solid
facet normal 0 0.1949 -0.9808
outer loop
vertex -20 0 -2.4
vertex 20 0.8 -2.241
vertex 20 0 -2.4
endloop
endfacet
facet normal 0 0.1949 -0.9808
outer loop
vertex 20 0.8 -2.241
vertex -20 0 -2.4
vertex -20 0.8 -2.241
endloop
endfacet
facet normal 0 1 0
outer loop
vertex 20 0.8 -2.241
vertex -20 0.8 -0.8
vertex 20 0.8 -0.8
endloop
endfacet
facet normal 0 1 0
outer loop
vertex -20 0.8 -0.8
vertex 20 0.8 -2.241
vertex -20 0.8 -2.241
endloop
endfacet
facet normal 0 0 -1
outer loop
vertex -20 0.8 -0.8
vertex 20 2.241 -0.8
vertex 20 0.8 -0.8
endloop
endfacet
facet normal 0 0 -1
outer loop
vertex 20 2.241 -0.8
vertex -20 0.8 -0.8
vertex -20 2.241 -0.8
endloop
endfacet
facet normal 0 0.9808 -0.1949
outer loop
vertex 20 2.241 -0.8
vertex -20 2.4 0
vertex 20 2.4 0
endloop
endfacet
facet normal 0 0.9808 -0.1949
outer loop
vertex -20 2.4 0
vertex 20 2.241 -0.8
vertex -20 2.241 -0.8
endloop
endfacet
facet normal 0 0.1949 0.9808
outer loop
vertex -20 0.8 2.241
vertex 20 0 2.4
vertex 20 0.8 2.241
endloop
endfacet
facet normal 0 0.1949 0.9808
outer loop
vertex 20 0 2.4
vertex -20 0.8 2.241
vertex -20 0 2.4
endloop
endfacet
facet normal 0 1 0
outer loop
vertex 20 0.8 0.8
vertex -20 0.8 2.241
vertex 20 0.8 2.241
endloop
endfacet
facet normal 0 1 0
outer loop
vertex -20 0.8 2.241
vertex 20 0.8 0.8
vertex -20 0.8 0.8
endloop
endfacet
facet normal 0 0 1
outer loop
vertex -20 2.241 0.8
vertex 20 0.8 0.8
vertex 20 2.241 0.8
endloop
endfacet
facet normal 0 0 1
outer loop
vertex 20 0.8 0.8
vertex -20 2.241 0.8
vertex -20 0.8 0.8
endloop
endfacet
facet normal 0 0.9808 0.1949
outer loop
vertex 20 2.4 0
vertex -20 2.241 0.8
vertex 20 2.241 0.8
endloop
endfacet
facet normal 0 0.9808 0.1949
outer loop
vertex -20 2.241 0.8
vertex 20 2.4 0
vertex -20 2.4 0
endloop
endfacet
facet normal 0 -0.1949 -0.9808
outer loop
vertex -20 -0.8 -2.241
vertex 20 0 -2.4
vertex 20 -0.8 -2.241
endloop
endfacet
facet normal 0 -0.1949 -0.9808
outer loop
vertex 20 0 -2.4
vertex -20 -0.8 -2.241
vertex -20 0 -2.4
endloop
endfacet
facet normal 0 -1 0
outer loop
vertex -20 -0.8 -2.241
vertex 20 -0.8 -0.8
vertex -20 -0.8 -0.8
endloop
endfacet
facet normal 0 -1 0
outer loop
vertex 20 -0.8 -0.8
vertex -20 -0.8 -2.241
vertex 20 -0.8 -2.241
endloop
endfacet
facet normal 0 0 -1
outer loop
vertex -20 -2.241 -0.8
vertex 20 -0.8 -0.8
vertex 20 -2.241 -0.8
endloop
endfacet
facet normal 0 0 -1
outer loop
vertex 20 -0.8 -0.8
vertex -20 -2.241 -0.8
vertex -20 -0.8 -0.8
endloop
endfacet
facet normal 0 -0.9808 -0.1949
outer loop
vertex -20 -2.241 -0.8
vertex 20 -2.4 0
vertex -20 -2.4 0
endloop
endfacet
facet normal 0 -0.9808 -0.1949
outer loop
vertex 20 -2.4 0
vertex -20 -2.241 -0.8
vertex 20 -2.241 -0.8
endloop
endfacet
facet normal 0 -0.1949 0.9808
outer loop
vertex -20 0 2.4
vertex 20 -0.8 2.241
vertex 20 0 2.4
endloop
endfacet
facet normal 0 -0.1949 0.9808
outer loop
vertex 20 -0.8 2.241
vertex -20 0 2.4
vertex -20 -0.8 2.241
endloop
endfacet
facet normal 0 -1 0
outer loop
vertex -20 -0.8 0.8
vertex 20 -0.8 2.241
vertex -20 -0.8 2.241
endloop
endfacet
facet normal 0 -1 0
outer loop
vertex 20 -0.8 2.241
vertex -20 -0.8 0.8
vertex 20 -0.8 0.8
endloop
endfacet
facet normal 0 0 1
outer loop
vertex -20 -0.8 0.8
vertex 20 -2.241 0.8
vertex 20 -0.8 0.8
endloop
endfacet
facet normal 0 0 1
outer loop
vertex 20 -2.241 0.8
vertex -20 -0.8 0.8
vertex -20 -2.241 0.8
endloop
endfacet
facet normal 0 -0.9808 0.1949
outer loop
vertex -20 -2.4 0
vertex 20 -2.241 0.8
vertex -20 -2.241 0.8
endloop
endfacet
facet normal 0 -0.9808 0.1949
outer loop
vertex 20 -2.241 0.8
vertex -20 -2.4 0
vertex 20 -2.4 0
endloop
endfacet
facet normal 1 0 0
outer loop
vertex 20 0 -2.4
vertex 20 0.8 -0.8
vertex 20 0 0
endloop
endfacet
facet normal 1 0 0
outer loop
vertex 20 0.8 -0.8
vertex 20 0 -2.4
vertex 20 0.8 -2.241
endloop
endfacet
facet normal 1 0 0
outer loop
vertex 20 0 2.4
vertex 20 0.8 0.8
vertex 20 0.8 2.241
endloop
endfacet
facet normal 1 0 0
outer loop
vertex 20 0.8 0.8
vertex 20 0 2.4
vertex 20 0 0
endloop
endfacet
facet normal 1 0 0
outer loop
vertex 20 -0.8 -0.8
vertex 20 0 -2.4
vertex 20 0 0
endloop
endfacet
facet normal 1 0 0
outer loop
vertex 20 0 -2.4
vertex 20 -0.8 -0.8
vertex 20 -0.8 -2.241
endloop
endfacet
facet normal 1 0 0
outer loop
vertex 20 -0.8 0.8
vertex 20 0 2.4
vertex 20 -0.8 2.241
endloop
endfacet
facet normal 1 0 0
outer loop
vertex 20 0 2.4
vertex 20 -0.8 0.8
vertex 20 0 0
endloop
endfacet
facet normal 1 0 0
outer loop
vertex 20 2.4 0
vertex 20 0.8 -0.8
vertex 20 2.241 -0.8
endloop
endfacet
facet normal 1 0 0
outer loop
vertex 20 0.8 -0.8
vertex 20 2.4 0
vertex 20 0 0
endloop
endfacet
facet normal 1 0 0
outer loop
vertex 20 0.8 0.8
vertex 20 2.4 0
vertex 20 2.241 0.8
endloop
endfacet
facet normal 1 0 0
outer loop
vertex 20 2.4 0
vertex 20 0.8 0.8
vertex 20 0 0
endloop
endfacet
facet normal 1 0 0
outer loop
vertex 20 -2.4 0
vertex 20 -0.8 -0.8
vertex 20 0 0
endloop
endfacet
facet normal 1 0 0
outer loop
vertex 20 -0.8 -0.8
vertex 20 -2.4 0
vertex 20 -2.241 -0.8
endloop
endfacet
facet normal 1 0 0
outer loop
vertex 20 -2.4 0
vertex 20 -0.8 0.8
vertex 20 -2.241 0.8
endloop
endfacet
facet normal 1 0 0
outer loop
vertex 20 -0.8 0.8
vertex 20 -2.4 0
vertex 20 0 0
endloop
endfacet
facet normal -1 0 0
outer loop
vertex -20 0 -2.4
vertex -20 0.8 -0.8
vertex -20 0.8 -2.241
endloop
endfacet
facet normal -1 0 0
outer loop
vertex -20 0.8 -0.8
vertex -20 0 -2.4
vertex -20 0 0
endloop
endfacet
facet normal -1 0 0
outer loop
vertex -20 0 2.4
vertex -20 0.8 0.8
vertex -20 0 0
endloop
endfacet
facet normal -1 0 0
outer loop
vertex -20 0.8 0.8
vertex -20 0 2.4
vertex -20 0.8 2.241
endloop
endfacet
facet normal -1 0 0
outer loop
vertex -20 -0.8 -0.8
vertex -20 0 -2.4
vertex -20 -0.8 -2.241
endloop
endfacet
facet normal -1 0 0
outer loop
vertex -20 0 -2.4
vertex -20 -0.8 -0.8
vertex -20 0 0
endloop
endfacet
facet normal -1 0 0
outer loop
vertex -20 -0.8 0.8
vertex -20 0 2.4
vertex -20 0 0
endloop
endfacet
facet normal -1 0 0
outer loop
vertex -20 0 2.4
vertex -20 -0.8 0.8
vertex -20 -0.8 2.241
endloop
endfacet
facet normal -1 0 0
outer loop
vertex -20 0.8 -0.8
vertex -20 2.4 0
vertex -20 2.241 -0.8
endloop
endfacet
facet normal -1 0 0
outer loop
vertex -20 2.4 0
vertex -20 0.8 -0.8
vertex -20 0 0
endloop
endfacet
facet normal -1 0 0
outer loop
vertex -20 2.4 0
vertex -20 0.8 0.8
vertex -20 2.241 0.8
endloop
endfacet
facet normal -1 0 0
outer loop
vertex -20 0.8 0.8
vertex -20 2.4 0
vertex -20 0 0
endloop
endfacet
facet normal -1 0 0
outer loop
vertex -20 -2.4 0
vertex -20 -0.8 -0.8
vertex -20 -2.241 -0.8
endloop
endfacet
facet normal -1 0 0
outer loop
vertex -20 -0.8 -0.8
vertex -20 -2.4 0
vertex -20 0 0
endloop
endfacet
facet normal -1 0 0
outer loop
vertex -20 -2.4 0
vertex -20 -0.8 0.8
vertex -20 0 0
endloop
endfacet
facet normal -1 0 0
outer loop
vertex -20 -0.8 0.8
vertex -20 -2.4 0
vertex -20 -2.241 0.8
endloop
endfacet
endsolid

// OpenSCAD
// file: ../p/axle.scad
use <../lib.scad>
function ldraw_lib__axle() = [
// 0 Axle
// 0 Name: axle.dat
// 0 Author: James Jessiman
// 0 !LDRAW_ORG Primitive UPDATE 2003-01
// 0 !LICENSE Licensed under CC BY 2.0 and CC BY 4.0 : see CAreadme.txt
// 
// 0 BFC CERTIFY CCW
  [0,"BFC","CERTIFY"],
  [0,"BFC","CCW"],
// 
// 0 !HISTORY 2000-04-23 [sbliss] Added conditional edges along outermost diameters
// 0 !HISTORY 2000-05-07 [PTadmin] Official Update 2000-01
// 0 !HISTORY 2002-11-08 [OrionP] Adjusted fit and precision
// 0 !HISTORY 2003-03-12 [PTadmin] Official Update 2003-01
// 0 !HISTORY 2007-06-24 [PTadmin] Header formatted for Contributor Agreement
// 0 !HISTORY 2008-07-01 [PTadmin] Official Update 2008-01
// 
// 
// 5 24 6 0 0 6 1 0 5.602 0 2 5.602 0 -2
  [5,24,6,0,0,6,1,0,5.602,0,2,5.602,0,-2],
// 5 24 0 0 6 0 1 6 2 0 5.602 -2 0 5.602
  [5,24,0,0,6,0,1,6,2,0,5.602,-2,0,5.602],
// 5 24 -6 0 0 -6 1 0 -5.602 0 -2 -5.602 0 2
  [5,24,-6,0,0,-6,1,0,-5.602,0,-2,-5.602,0,2],
// 5 24 0 0 -6 0 1 -6 -2 0 -5.602 2 0 -5.602
  [5,24,0,0,-6,0,1,-6,-2,0,-5.602,2,0,-5.602],
// 
// 2 24 6 0 0 5.602 0 2
  [2,24,6,0,0,5.602,0,2],
// 2 24 5.602 0 2 2 0 2
  [2,24,5.602,0,2,2,0,2],
// 2 24 2 0 2 2 0 5.602
  [2,24,2,0,2,2,0,5.602],
// 2 24 2 0 5.602 0 0 6
  [2,24,2,0,5.602,0,0,6],
// 2 24 -6 0 0 -5.602 0 2
  [2,24,-6,0,0,-5.602,0,2],
// 2 24 -5.602 0 2 -2 0 2
  [2,24,-5.602,0,2,-2,0,2],
// 2 24 -2 0 2 -2 0 5.602
  [2,24,-2,0,2,-2,0,5.602],
// 2 24 -2 0 5.602 -0 0 6
  [2,24,-2,0,5.602,-0,0,6],
// 2 24 6 0 -0 5.602 0 -2
  [2,24,6,0,-0,5.602,0,-2],
// 2 24 5.602 0 -2 2 0 -2
  [2,24,5.602,0,-2,2,0,-2],
// 2 24 2 0 -2 2 0 -5.602
  [2,24,2,0,-2,2,0,-5.602],
// 2 24 2 0 -5.602 0 0 -6
  [2,24,2,0,-5.602,0,0,-6],
// 2 24 -6 0 -0 -5.602 0 -2
  [2,24,-6,0,-0,-5.602,0,-2],
// 2 24 -5.602 0 -2 -2 0 -2
  [2,24,-5.602,0,-2,-2,0,-2],
// 2 24 -2 0 -2 -2 0 -5.602
  [2,24,-2,0,-2,-2,0,-5.602],
// 2 24 -2 0 -5.602 -0 0 -6
  [2,24,-2,0,-5.602,-0,0,-6],
// 2 24 6 1 0 5.602 1 2
  [2,24,6,1,0,5.602,1,2],
// 2 24 5.602 1 2 2 1 2
  [2,24,5.602,1,2,2,1,2],
// 2 24 2 1 2 2 1 5.602
  [2,24,2,1,2,2,1,5.602],
// 2 24 2 1 5.602 0 1 6
  [2,24,2,1,5.602,0,1,6],
// 2 24 -6 1 0 -5.602 1 2
  [2,24,-6,1,0,-5.602,1,2],
// 2 24 -5.602 1 2 -2 1 2
  [2,24,-5.602,1,2,-2,1,2],
// 2 24 -2 1 2 -2 1 5.602
  [2,24,-2,1,2,-2,1,5.602],
// 2 24 -2 1 5.602 -0 1 6
  [2,24,-2,1,5.602,-0,1,6],
// 2 24 6 1 -0 5.602 1 -2
  [2,24,6,1,-0,5.602,1,-2],
// 2 24 5.602 1 -2 2 1 -2
  [2,24,5.602,1,-2,2,1,-2],
// 2 24 2 1 -2 2 1 -5.602
  [2,24,2,1,-2,2,1,-5.602],
// 2 24 2 1 -5.602 0 1 -6
  [2,24,2,1,-5.602,0,1,-6],
// 2 24 -6 1 -0 -5.602 1 -2
  [2,24,-6,1,-0,-5.602,1,-2],
// 2 24 -5.602 1 -2 -2 1 -2
  [2,24,-5.602,1,-2,-2,1,-2],
// 2 24 -2 1 -2 -2 1 -5.602
  [2,24,-2,1,-2,-2,1,-5.602],
// 2 24 -2 1 -5.602 -0 1 -6
  [2,24,-2,1,-5.602,-0,1,-6],
// 
// 2 24 5.602 0 2 5.602 1 2
  [2,24,5.602,0,2,5.602,1,2],
// 2 24 2 0 2 2 1 2
  [2,24,2,0,2,2,1,2],
// 2 24 2 0 5.602 2 1 5.602
  [2,24,2,0,5.602,2,1,5.602],
// 2 24 -5.602 0 2 -5.602 1 2
  [2,24,-5.602,0,2,-5.602,1,2],
// 2 24 -2 0 2 -2 1 2
  [2,24,-2,0,2,-2,1,2],
// 2 24 -2 0 5.602 -2 1 5.602
  [2,24,-2,0,5.602,-2,1,5.602],
// 2 24 5.602 0 -2 5.602 1 -2
  [2,24,5.602,0,-2,5.602,1,-2],
// 2 24 2 0 -2 2 1 -2
  [2,24,2,0,-2,2,1,-2],
// 2 24 2 0 -5.602 2 1 -5.602
  [2,24,2,0,-5.602,2,1,-5.602],
// 2 24 -5.602 0 -2 -5.602 1 -2
  [2,24,-5.602,0,-2,-5.602,1,-2],
// 2 24 -2 0 -2 -2 1 -2
  [2,24,-2,0,-2,-2,1,-2],
// 2 24 -2 0 -5.602 -2 1 -5.602
  [2,24,-2,0,-5.602,-2,1,-5.602],
// 
// 4 16 6 0 0 6 1 0 5.602 1 2 5.602 0 2
  [4,16,6,0,0,6,1,0,5.602,1,2,5.602,0,2],
// 4 16 5.602 0 2 5.602 1 2 2 1 2 2 0 2
  [4,16,5.602,0,2,5.602,1,2,2,1,2,2,0,2],
// 4 16 2 0 2 2 1 2 2 1 5.602 2 0 5.602
  [4,16,2,0,2,2,1,2,2,1,5.602,2,0,5.602],
// 4 16 2 0 5.602 2 1 5.602 0 1 6 0 0 6
  [4,16,2,0,5.602,2,1,5.602,0,1,6,0,0,6],
// 4 16 -6 0 0 -5.602 0 2 -5.602 1 2 -6 1 0
  [4,16,-6,0,0,-5.602,0,2,-5.602,1,2,-6,1,0],
// 4 16 -5.602 0 2 -2 0 2 -2 1 2 -5.602 1 2
  [4,16,-5.602,0,2,-2,0,2,-2,1,2,-5.602,1,2],
// 4 16 -2 0 2 -2 0 5.602 -2 1 5.602 -2 1 2
  [4,16,-2,0,2,-2,0,5.602,-2,1,5.602,-2,1,2],
// 4 16 -2 0 5.602 -0 0 6 -0 1 6 -2 1 5.602
  [4,16,-2,0,5.602,-0,0,6,-0,1,6,-2,1,5.602],
// 4 16 6 0 -0 5.602 0 -2 5.602 1 -2 6 1 -0
  [4,16,6,0,-0,5.602,0,-2,5.602,1,-2,6,1,-0],
// 4 16 5.602 0 -2 2 0 -2 2 1 -2 5.602 1 -2
  [4,16,5.602,0,-2,2,0,-2,2,1,-2,5.602,1,-2],
// 4 16 2 0 -2 2 0 -5.602 2 1 -5.602 2 1 -2
  [4,16,2,0,-2,2,0,-5.602,2,1,-5.602,2,1,-2],
// 4 16 2 0 -5.602 0 0 -6 0 1 -6 2 1 -5.602
  [4,16,2,0,-5.602,0,0,-6,0,1,-6,2,1,-5.602],
// 4 16 -6 0 -0 -6 1 -0 -5.602 1 -2 -5.602 0 -2
  [4,16,-6,0,-0,-6,1,-0,-5.602,1,-2,-5.602,0,-2],
// 4 16 -5.602 0 -2 -5.602 1 -2 -2 1 -2 -2 0 -2
  [4,16,-5.602,0,-2,-5.602,1,-2,-2,1,-2,-2,0,-2],
// 4 16 -2 0 -2 -2 1 -2 -2 1 -5.602 -2 0 -5.602
  [4,16,-2,0,-2,-2,1,-2,-2,1,-5.602,-2,0,-5.602],
// 4 16 -2 0 -5.602 -2 1 -5.602 -0 1 -6 -0 0 -6
  [4,16,-2,0,-5.602,-2,1,-5.602,-0,1,-6,-0,0,-6],
// 
// 4 16 6 0 0 5.602 0 2 2 0 2 0 0 0
  [4,16,6,0,0,5.602,0,2,2,0,2,0,0,0],
// 4 16 -6 0 0 0 0 0 -2 0 2 -5.602 0 2
  [4,16,-6,0,0,0,0,0,-2,0,2,-5.602,0,2],
// 4 16 6 0 0 0 0 0 2 0 -2 5.602 0 -2
  [4,16,6,0,0,0,0,0,2,0,-2,5.602,0,-2],
// 4 16 -6 0 0 -5.602 0 -2 -2 0 -2 0 0 0
  [4,16,-6,0,0,-5.602,0,-2,-2,0,-2,0,0,0],
// 4 16 0 0 6 0 0 0 2 0 2 2 0 5.602
  [4,16,0,0,6,0,0,0,2,0,2,2,0,5.602],
// 4 16 0 0 6 -2 0 5.602 -2 0 2 0 0 0
  [4,16,0,0,6,-2,0,5.602,-2,0,2,0,0,0],
// 4 16 0 0 -6 2 0 -5.602 2 0 -2 0 0 0
  [4,16,0,0,-6,2,0,-5.602,2,0,-2,0,0,0],
// 4 16 0 0 -6 0 0 0 -2 0 -2 -2 0 -5.602
  [4,16,0,0,-6,0,0,0,-2,0,-2,-2,0,-5.602],
// 4 16 6 1 0 0 1 0 2 1 2 5.602 1 2
  [4,16,6,1,0,0,1,0,2,1,2,5.602,1,2],
// 4 16 -6 1 0 -5.602 1 2 -2 1 2 0 1 0
  [4,16,-6,1,0,-5.602,1,2,-2,1,2,0,1,0],
// 4 16 6 1 0 5.602 1 -2 2 1 -2 0 1 0
  [4,16,6,1,0,5.602,1,-2,2,1,-2,0,1,0],
// 4 16 -6 1 0 0 1 0 -2 1 -2 -5.602 1 -2
  [4,16,-6,1,0,0,1,0,-2,1,-2,-5.602,1,-2],
// 4 16 0 1 6 2 1 5.602 2 1 2 0 1 0
  [4,16,0,1,6,2,1,5.602,2,1,2,0,1,0],
// 4 16 0 1 6 0 1 0 -2 1 2 -2 1 5.602
  [4,16,0,1,6,0,1,0,-2,1,2,-2,1,5.602],
// 4 16 0 1 -6 0 1 0 2 1 -2 2 1 -5.602
  [4,16,0,1,-6,0,1,0,2,1,-2,2,1,-5.602],
// 4 16 0 1 -6 -2 1 -5.602 -2 1 -2 0 1 0
  [4,16,0,1,-6,-2,1,-5.602,-2,1,-2,0,1,0],
// 0
];
module ldraw_lib__axle(step=0, col=false, unit=2/5, alt=false, line=0.2, solid=!$preview)
    makepoly(ldraw_lib__axle(), step=step, col=col, unit=unit, alt=alt, line=line, solid=solid);
ldraw_lib__axle(line=0.2);
// main file
use <../lib.scad>
use <../p/axle.scad>
function ldraw_lib__32073() = [
// 0 Technic Axle  5
// 0 Name: 32073.dat
// 0 Author: William Howard [WilliamH]
// 0 !LDRAW_ORG Part UPDATE 2009-02
// 0 !LICENSE Licensed under CC BY 2.0 and CC BY 4.0 : see CAreadme.txt
// 
// 0 BFC CERTIFY CCW
  [0,"BFC","CERTIFY"],
  [0,"BFC","CCW"],
// 
// 0 !HISTORY 2009-09-03 [PTadmin] Official Update 2009-02
// 
// 
// 1 16 50 0 0 0 -100 0 1 0 0 0 0 1 axle.dat
  [1,16,50,0,0,0,-100,0,1,0,0,0,0,1, ldraw_lib__axle()],
// 0
];
module ldraw_lib__32073(step=0, col=false, unit=2/5, alt=false, line=0.2, solid=!$preview)
    makepoly(ldraw_lib__32073(), step=step, col=col, unit=unit, alt=alt, line=line, solid=solid);
ldraw_lib__32073(line=0.2);
